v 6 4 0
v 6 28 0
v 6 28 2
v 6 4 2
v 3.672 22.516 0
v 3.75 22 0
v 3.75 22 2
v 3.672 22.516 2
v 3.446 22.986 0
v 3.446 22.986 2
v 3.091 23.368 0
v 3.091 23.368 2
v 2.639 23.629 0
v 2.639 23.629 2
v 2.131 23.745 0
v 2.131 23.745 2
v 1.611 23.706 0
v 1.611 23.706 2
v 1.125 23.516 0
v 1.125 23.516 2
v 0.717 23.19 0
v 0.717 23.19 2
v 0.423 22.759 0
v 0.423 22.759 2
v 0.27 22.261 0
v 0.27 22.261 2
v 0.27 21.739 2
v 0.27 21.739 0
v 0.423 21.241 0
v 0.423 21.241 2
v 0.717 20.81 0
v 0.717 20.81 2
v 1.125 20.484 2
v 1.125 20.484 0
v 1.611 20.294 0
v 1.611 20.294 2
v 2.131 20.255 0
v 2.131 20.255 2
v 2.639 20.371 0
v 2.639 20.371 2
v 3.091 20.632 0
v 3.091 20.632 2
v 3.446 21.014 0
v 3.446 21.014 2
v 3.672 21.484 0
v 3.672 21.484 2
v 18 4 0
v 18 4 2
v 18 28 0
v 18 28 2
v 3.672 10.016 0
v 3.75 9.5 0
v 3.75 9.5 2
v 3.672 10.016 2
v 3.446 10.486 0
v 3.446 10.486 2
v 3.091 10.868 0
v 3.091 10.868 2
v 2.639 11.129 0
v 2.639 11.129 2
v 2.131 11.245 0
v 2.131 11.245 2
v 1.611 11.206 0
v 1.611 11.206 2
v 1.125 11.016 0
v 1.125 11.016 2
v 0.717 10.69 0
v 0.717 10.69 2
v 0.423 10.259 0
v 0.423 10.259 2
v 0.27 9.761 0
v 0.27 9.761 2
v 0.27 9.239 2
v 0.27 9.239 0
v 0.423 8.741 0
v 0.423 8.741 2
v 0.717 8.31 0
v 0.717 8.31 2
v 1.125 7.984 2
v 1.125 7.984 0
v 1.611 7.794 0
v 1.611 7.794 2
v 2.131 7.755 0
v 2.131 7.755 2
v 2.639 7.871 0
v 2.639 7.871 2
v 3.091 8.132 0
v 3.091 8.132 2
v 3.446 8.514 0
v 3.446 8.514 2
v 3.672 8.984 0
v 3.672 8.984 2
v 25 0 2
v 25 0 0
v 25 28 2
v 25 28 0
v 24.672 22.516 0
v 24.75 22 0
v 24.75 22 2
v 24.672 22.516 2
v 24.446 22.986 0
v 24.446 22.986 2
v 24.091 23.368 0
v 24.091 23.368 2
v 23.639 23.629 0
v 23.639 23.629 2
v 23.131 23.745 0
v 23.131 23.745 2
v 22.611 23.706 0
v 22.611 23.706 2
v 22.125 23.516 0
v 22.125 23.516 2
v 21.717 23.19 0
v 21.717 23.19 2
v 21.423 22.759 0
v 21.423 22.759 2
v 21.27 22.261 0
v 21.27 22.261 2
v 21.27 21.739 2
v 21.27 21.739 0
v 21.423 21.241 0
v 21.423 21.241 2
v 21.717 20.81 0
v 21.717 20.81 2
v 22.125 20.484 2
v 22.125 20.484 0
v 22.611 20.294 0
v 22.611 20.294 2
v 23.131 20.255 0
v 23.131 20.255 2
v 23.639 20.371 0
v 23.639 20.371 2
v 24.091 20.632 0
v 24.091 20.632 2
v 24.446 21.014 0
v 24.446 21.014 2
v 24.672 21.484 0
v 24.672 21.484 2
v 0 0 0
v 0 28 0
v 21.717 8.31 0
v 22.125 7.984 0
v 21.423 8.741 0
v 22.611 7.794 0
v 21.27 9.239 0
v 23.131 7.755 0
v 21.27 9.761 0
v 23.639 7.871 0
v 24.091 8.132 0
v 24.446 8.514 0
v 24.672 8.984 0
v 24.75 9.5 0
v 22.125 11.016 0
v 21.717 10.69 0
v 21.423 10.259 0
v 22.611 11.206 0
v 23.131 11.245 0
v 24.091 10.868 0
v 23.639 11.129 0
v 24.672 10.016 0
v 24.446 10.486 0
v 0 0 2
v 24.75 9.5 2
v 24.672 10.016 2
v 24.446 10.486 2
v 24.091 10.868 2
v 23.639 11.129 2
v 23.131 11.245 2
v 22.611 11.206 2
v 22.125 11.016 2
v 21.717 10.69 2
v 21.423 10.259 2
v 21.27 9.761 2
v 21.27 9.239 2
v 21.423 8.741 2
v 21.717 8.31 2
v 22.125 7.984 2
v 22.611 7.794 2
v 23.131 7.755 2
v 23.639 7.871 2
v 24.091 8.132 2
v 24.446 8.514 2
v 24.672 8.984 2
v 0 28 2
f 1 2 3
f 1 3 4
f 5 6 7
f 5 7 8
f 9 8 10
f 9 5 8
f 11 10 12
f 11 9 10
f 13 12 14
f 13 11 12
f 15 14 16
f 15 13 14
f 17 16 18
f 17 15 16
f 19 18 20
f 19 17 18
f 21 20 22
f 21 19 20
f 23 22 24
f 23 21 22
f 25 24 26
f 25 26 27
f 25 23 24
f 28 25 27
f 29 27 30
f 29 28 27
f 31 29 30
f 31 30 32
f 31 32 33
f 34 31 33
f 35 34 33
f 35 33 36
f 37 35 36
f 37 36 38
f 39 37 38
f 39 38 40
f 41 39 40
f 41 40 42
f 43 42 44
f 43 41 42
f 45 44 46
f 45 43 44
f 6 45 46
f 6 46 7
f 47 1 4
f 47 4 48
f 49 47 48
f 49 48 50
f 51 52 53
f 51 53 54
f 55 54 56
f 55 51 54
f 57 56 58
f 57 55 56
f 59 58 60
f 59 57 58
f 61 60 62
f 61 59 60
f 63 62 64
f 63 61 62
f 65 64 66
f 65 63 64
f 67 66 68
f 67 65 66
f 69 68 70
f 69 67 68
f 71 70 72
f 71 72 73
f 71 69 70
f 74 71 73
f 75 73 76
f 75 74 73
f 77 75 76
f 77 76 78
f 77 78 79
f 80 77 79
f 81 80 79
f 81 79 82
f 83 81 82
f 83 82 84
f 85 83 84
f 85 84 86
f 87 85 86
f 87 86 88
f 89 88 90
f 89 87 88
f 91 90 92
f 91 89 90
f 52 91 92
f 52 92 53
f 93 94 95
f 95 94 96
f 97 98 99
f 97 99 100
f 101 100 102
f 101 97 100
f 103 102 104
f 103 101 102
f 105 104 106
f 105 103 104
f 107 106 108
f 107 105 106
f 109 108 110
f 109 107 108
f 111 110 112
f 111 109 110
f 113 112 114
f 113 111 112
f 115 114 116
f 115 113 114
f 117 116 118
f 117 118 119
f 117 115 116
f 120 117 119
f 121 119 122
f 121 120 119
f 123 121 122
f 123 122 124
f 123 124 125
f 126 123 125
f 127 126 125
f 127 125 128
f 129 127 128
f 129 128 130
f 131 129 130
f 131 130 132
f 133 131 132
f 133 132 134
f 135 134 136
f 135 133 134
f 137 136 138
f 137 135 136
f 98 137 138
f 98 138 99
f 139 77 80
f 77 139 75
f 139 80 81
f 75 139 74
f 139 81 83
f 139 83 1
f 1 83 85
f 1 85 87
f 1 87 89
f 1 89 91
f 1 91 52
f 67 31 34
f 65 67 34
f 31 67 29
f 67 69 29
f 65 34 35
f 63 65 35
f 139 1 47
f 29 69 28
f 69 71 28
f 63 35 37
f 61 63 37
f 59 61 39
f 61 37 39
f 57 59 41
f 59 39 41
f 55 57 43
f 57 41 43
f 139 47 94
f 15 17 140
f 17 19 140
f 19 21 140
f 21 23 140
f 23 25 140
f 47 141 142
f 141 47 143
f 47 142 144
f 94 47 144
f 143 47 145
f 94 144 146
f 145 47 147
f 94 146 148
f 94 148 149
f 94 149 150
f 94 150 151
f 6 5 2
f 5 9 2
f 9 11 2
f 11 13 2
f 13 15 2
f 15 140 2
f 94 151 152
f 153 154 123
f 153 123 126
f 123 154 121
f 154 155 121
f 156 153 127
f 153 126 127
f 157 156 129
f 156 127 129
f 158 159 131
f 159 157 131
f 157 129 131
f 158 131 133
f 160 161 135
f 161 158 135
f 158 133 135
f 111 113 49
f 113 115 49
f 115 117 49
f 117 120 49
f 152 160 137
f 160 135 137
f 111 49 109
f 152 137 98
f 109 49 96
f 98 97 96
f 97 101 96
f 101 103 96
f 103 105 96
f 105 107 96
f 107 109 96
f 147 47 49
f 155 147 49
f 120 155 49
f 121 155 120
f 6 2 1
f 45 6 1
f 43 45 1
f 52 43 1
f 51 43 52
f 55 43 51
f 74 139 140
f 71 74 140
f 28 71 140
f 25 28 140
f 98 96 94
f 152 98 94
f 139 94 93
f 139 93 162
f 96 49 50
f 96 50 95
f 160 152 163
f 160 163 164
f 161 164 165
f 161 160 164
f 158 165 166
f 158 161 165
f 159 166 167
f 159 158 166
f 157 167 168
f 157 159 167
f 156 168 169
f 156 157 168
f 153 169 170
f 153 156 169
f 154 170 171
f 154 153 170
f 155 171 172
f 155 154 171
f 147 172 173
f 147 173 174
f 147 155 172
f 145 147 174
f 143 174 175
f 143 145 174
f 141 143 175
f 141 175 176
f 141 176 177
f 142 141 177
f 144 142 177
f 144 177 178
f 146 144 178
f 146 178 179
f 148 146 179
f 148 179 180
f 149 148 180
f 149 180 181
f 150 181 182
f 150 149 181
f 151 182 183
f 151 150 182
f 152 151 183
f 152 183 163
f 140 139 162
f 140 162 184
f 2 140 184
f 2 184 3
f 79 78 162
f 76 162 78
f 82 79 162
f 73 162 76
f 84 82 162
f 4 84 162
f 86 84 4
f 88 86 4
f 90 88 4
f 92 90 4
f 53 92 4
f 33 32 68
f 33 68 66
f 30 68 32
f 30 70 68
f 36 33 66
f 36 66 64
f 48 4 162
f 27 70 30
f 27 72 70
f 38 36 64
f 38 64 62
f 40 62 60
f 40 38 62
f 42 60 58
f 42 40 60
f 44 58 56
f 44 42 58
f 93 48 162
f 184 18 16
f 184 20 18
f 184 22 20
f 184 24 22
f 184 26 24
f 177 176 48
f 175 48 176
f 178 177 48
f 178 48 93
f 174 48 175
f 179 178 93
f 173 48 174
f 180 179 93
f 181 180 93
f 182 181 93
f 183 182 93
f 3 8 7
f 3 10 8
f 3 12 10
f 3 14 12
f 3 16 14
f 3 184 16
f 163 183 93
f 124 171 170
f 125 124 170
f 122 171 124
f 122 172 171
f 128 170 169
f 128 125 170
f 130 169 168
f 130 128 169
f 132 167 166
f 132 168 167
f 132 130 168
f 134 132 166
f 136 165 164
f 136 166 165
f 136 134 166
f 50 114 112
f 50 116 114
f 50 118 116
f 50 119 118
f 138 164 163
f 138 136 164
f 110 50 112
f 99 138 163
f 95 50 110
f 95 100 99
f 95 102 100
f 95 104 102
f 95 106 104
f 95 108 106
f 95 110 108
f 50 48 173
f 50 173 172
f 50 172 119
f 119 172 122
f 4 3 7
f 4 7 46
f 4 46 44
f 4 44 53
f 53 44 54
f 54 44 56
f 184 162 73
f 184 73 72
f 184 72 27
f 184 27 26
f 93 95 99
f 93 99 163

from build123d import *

# Parameters (mm, degrees)
SKETCH_1_R      = 1.75
SKETCH_1_W      = 6
SKETCH_1_H      = 4
SKETCH_1_W_2    = 7
EXTRUDE_6_DEPTH = 2


with BuildPart() as part:
    # ｽｹｯﾁ1 → ﾎﾞｽ - 押し出し6 (new body)
    # profile 1 of 3: a face of its own
    with BuildSketch(Plane.XY):
        Polygon((18, 24), (25, 24), (25, 0), (0, 0), (0, 24), (6, 24), (6, 4), (18, 4), align=None)
        with Locations((23, 9.5)):
            Circle(SKETCH_1_R, mode=Mode.SUBTRACT)
        with Locations((2, 9.5)):
            Circle(SKETCH_1_R, mode=Mode.SUBTRACT)
        with Locations((23, 22)):
            Circle(SKETCH_1_R, mode=Mode.SUBTRACT)
        with Locations((2, 22)):
            Circle(SKETCH_1_R, mode=Mode.SUBTRACT)
    # profile 2 of 3: a face of its own
    with BuildSketch(Plane.XY):
        with Locations((3, 26)):
            Rectangle(SKETCH_1_W, SKETCH_1_H)
    # profile 3 of 3: a face of its own
    with BuildSketch(Plane.XY):
        with Locations((21.5, 26)):
            Rectangle(SKETCH_1_W_2, SKETCH_1_H)
    extrude(amount=EXTRUDE_6_DEPTH)


solid = part.part
